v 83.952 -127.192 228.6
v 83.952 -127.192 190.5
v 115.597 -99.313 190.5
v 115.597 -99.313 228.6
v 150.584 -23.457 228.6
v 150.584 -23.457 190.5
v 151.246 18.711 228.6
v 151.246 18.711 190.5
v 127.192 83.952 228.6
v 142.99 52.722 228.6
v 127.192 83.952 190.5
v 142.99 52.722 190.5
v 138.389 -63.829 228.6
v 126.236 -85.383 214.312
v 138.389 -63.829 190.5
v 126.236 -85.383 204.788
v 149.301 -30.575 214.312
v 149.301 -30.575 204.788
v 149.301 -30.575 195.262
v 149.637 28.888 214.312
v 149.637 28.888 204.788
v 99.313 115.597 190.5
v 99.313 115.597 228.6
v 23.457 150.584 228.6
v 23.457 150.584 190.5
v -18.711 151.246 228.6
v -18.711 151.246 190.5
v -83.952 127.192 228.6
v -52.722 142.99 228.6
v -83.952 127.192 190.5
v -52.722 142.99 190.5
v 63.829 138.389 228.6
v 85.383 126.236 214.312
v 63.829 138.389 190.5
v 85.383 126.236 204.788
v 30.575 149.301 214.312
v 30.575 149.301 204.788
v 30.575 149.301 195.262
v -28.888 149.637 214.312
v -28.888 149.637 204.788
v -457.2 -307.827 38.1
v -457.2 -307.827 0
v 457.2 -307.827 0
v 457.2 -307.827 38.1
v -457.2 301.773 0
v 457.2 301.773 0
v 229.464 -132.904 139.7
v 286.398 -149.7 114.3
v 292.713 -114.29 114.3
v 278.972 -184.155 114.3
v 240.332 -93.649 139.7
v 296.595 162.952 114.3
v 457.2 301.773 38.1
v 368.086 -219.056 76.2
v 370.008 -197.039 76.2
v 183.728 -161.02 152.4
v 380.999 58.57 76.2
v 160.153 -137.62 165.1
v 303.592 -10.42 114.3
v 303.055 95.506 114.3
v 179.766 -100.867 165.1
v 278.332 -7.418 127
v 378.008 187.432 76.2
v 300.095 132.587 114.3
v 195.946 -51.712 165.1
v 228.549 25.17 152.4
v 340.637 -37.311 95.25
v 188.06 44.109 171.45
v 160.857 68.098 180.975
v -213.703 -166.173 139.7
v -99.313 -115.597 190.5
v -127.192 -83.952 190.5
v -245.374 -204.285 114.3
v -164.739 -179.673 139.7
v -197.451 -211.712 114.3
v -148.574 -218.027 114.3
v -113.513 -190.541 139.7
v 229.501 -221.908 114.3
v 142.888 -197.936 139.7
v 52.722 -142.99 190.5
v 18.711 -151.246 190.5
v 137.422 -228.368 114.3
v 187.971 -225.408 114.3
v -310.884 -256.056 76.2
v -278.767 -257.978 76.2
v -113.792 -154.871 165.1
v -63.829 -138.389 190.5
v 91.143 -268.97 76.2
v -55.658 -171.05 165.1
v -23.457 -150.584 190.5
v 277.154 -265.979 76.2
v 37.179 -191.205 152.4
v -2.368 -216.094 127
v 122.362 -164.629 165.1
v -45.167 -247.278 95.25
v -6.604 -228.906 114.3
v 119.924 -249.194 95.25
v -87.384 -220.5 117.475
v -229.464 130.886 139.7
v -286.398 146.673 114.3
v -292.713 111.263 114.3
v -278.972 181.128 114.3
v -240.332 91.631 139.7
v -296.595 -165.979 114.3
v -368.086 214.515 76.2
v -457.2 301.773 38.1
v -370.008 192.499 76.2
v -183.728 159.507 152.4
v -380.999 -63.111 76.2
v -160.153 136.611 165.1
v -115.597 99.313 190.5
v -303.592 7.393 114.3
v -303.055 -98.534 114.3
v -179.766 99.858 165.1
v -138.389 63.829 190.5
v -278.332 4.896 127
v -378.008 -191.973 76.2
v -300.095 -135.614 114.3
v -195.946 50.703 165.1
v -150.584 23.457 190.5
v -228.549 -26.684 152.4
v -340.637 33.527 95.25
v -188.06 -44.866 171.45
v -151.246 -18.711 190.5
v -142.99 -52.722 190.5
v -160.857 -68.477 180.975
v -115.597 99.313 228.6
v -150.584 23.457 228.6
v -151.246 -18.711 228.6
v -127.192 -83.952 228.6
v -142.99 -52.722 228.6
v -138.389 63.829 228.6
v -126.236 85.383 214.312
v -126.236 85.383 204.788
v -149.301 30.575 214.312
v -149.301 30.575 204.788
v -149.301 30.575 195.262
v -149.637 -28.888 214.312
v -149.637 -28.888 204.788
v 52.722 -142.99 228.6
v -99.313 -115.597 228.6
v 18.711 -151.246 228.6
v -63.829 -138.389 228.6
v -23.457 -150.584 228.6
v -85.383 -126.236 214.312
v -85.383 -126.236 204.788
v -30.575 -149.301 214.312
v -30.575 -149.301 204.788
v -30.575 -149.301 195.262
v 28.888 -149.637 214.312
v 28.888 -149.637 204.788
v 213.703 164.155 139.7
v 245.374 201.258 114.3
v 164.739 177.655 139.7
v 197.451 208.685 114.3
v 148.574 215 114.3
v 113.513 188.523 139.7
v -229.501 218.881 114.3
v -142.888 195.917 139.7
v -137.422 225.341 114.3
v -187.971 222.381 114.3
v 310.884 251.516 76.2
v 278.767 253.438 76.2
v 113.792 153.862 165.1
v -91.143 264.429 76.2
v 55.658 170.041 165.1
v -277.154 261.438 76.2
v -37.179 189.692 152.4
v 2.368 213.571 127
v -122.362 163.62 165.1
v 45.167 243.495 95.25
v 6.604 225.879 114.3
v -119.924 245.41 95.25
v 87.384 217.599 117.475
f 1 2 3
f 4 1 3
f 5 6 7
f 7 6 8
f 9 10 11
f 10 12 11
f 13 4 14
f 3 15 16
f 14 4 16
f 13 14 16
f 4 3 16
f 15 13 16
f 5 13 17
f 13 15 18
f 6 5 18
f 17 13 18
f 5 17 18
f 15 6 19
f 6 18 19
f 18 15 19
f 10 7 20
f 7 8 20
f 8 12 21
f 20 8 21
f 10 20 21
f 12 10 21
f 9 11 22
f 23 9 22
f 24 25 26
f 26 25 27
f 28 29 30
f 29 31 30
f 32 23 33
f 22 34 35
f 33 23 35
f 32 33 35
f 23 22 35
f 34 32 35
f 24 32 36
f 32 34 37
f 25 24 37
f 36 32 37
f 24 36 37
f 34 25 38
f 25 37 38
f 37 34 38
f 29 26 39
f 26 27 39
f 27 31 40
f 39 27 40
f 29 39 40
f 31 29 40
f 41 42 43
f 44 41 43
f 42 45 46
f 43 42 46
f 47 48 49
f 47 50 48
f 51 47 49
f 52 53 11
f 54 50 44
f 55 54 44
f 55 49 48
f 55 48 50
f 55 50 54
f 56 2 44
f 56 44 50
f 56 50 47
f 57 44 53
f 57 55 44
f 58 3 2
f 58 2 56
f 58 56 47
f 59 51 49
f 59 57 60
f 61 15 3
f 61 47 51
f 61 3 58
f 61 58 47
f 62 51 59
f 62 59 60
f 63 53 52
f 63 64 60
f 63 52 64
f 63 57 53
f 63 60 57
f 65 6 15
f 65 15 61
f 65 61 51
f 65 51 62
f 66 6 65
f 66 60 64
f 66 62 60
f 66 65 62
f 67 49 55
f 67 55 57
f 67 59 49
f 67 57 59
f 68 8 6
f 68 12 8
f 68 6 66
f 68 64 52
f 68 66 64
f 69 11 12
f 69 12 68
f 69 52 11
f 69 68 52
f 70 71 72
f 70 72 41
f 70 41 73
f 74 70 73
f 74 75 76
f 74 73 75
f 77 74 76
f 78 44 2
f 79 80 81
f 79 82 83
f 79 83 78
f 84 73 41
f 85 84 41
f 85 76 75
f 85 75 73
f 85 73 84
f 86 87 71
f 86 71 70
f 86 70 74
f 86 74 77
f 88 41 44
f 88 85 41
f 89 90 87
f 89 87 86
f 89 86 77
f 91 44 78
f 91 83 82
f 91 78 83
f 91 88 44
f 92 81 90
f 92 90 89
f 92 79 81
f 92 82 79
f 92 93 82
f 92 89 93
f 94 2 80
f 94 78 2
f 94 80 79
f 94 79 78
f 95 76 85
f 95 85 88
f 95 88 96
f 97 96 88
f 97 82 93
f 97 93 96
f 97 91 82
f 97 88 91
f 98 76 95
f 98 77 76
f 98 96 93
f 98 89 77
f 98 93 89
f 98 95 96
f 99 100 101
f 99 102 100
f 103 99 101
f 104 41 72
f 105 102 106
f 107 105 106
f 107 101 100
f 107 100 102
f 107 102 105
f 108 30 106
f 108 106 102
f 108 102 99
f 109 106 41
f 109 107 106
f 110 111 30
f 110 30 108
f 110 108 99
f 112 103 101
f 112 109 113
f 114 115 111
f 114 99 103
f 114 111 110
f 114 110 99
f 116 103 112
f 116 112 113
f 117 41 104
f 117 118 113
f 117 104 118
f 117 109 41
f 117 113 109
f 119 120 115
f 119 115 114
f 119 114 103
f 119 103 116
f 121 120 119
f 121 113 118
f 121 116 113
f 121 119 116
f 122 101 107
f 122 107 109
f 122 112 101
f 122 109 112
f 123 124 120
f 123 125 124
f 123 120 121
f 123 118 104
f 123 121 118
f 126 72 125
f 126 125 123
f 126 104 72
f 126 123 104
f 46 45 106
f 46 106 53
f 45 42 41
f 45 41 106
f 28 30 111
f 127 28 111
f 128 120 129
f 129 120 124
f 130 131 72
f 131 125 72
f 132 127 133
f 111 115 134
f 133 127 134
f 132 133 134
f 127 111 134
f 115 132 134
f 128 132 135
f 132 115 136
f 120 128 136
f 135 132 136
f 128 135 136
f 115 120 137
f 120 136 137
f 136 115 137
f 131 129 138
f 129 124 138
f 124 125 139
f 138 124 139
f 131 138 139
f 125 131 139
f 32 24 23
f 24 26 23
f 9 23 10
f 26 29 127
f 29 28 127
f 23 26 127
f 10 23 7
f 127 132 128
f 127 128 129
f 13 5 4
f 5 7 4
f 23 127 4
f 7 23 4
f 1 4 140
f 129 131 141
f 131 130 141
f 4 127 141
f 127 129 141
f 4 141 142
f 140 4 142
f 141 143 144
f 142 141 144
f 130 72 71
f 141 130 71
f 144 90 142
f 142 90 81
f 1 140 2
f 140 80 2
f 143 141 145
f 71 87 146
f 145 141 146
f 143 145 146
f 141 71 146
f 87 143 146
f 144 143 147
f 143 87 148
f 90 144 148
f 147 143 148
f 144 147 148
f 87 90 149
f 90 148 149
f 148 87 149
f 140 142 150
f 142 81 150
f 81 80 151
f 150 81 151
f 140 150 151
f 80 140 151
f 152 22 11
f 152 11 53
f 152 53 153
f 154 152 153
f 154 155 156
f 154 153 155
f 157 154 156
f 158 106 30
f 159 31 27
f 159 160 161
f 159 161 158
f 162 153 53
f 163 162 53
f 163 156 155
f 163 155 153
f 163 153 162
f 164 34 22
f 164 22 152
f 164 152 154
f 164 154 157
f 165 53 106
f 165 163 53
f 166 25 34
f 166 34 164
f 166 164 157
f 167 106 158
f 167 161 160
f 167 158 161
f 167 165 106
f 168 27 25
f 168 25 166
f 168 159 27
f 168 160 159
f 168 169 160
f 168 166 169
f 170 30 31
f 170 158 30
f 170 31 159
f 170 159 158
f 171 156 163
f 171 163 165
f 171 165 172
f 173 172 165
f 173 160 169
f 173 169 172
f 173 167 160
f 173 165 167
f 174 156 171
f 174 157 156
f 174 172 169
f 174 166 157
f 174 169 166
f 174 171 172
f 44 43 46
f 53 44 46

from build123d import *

# Parameters (mm, degrees)
F0_W      = 914.4
F0_H      = 609.6
F1_DEPTH  = 38.1
F1_FACE_W = 914.4
F1_FACE_H = 609.6
F5_DEPTH  = 38.1


# Not quite as in the source:
# - the arcs of a loft's sections are written as splines that run evenly, so that the points pair up as in the source's solid


with BuildPart() as f1:
    # F0 (on Top) → F1 (new body)
    with BuildSketch(Plane.XY):
        with Locations((0, -3.0270647792)):
            Rectangle(F0_W, F0_H)
    extrude(amount=F1_DEPTH)

    # F1_face (on face) → F4 section 0
    with BuildSketch(Plane(origin=(0, -3.0270647792, 38.1), x_dir=(1, 0, 0), z_dir=(0, 0, 1))):
        Rectangle(F1_FACE_W, F1_FACE_H)
    # F3 (on offset) → F4 section 1
    with BuildSketch(Plane.XY.offset(190.5)):
        with BuildLine():
            add(Edge.make_bspline(
                [(127.1917959248, 83.9524094319), (121.6971235765, 92.2770930084), (115.3826976006, 100.0604061319), (101.3563796815, 114.245945568), (93.6448345666, 120.6478211153), (77.1205669567, 131.8243905093), (68.3082530567, 136.5988079933), (49.9210540934, 144.3368980513), (40.3466236897, 147.3003792857), (20.8031031174, 151.3026195462), (10.8344962009, 152.3412796091), (-9.1142994449, 152.4538662235), (-19.0939949009, 151.5277899911), (-38.6814445909, 147.7463963189), (-48.2887144867, 144.8911723815), (-66.7620835141, 137.3611152609), (-75.6277258553, 132.6864682732), (-83.9524094319, 127.1917959248)],
                knots=[0, 0, 0, 0, 0.125, 0.125, 0.25, 0.25, 0.375, 0.375, 0.5, 0.5, 0.625, 0.625, 0.75, 0.75, 0.875, 0.875, 1, 1, 1, 1], degree=3))
            add(Edge.make_bspline(
                [(-83.9524094319, 127.1917959248), (-92.2770930084, 121.6971235765), (-100.0604061319, 115.3826976006), (-114.245945568, 101.3563796815), (-120.6478211153, 93.6448345666), (-131.8243905093, 77.1205669567), (-136.5988079933, 68.3082530567), (-144.3368980513, 49.9210540934), (-147.3003792857, 40.3466236897), (-151.3026195462, 20.8031031174), (-152.3412796091, 10.8344962009), (-152.4538662235, -9.1142994449), (-151.5277899911, -19.0939949009), (-147.7463963189, -38.6814445909), (-144.8911723815, -48.2887144867), (-137.3611152609, -66.7620835141), (-132.6864682732, -75.6277258553), (-127.1917959248, -83.9524094319)],
                knots=[0, 0, 0, 0, 0.125, 0.125, 0.25, 0.25, 0.375, 0.375, 0.5, 0.5, 0.625, 0.625, 0.75, 0.75, 0.875, 0.875, 1, 1, 1, 1], degree=3))
            add(Edge.make_bspline(
                [(-127.1917959248, -83.9524094319), (-121.6971235765, -92.2770930084), (-115.3826976006, -100.0604061319), (-101.3563796815, -114.245945568), (-93.6448345666, -120.6478211153), (-77.1205669567, -131.8243905093), (-68.3082530567, -136.5988079933), (-49.9210540934, -144.3368980513), (-40.3466236897, -147.3003792857), (-20.8031031174, -151.3026195462), (-10.8344962009, -152.3412796091), (9.1142994449, -152.4538662235), (19.0939949009, -151.5277899911), (38.6814445909, -147.7463963189), (48.2887144867, -144.8911723815), (66.7620835141, -137.3611152609), (75.6277258553, -132.6864682732), (83.9524094319, -127.1917959248)],
                knots=[0, 0, 0, 0, 0.125, 0.125, 0.25, 0.25, 0.375, 0.375, 0.5, 0.5, 0.625, 0.625, 0.75, 0.75, 0.875, 0.875, 1, 1, 1, 1], degree=3))
            add(Edge.make_bspline(
                [(83.9524094319, -127.1917959248), (92.2770930084, -121.6971235765), (100.0604061319, -115.3826976006), (114.245945568, -101.3563796815), (120.6478211153, -93.6448345666), (131.8243905093, -77.1205669567), (136.5988079933, -68.3082530567), (144.3368980513, -49.9210540934), (147.3003792857, -40.3466236897), (151.3026195462, -20.8031031174), (152.3412796091, -10.8344962009), (152.4538662235, 9.1142994449), (151.5277899911, 19.0939949009), (147.7463963189, 38.6814445909), (144.8911723815, 48.2887144867), (137.3611152609, 66.7620835141), (132.6864682732, 75.6277258553), (127.1917959248, 83.9524094319)],
                knots=[0, 0, 0, 0, 0.125, 0.125, 0.25, 0.25, 0.375, 0.375, 0.5, 0.5, 0.625, 0.625, 0.75, 0.75, 0.875, 0.875, 1, 1, 1, 1], degree=3))
        make_face()
    loft(ruled=True)

    # F5 (add): a face of the model
    f5_faces = [f1.faces().sort_by_distance(p)[0] for p in [
        (0, 0, 190.5),
    ]]
    extrude(f5_faces, amount=F5_DEPTH)


solid = f1.part
